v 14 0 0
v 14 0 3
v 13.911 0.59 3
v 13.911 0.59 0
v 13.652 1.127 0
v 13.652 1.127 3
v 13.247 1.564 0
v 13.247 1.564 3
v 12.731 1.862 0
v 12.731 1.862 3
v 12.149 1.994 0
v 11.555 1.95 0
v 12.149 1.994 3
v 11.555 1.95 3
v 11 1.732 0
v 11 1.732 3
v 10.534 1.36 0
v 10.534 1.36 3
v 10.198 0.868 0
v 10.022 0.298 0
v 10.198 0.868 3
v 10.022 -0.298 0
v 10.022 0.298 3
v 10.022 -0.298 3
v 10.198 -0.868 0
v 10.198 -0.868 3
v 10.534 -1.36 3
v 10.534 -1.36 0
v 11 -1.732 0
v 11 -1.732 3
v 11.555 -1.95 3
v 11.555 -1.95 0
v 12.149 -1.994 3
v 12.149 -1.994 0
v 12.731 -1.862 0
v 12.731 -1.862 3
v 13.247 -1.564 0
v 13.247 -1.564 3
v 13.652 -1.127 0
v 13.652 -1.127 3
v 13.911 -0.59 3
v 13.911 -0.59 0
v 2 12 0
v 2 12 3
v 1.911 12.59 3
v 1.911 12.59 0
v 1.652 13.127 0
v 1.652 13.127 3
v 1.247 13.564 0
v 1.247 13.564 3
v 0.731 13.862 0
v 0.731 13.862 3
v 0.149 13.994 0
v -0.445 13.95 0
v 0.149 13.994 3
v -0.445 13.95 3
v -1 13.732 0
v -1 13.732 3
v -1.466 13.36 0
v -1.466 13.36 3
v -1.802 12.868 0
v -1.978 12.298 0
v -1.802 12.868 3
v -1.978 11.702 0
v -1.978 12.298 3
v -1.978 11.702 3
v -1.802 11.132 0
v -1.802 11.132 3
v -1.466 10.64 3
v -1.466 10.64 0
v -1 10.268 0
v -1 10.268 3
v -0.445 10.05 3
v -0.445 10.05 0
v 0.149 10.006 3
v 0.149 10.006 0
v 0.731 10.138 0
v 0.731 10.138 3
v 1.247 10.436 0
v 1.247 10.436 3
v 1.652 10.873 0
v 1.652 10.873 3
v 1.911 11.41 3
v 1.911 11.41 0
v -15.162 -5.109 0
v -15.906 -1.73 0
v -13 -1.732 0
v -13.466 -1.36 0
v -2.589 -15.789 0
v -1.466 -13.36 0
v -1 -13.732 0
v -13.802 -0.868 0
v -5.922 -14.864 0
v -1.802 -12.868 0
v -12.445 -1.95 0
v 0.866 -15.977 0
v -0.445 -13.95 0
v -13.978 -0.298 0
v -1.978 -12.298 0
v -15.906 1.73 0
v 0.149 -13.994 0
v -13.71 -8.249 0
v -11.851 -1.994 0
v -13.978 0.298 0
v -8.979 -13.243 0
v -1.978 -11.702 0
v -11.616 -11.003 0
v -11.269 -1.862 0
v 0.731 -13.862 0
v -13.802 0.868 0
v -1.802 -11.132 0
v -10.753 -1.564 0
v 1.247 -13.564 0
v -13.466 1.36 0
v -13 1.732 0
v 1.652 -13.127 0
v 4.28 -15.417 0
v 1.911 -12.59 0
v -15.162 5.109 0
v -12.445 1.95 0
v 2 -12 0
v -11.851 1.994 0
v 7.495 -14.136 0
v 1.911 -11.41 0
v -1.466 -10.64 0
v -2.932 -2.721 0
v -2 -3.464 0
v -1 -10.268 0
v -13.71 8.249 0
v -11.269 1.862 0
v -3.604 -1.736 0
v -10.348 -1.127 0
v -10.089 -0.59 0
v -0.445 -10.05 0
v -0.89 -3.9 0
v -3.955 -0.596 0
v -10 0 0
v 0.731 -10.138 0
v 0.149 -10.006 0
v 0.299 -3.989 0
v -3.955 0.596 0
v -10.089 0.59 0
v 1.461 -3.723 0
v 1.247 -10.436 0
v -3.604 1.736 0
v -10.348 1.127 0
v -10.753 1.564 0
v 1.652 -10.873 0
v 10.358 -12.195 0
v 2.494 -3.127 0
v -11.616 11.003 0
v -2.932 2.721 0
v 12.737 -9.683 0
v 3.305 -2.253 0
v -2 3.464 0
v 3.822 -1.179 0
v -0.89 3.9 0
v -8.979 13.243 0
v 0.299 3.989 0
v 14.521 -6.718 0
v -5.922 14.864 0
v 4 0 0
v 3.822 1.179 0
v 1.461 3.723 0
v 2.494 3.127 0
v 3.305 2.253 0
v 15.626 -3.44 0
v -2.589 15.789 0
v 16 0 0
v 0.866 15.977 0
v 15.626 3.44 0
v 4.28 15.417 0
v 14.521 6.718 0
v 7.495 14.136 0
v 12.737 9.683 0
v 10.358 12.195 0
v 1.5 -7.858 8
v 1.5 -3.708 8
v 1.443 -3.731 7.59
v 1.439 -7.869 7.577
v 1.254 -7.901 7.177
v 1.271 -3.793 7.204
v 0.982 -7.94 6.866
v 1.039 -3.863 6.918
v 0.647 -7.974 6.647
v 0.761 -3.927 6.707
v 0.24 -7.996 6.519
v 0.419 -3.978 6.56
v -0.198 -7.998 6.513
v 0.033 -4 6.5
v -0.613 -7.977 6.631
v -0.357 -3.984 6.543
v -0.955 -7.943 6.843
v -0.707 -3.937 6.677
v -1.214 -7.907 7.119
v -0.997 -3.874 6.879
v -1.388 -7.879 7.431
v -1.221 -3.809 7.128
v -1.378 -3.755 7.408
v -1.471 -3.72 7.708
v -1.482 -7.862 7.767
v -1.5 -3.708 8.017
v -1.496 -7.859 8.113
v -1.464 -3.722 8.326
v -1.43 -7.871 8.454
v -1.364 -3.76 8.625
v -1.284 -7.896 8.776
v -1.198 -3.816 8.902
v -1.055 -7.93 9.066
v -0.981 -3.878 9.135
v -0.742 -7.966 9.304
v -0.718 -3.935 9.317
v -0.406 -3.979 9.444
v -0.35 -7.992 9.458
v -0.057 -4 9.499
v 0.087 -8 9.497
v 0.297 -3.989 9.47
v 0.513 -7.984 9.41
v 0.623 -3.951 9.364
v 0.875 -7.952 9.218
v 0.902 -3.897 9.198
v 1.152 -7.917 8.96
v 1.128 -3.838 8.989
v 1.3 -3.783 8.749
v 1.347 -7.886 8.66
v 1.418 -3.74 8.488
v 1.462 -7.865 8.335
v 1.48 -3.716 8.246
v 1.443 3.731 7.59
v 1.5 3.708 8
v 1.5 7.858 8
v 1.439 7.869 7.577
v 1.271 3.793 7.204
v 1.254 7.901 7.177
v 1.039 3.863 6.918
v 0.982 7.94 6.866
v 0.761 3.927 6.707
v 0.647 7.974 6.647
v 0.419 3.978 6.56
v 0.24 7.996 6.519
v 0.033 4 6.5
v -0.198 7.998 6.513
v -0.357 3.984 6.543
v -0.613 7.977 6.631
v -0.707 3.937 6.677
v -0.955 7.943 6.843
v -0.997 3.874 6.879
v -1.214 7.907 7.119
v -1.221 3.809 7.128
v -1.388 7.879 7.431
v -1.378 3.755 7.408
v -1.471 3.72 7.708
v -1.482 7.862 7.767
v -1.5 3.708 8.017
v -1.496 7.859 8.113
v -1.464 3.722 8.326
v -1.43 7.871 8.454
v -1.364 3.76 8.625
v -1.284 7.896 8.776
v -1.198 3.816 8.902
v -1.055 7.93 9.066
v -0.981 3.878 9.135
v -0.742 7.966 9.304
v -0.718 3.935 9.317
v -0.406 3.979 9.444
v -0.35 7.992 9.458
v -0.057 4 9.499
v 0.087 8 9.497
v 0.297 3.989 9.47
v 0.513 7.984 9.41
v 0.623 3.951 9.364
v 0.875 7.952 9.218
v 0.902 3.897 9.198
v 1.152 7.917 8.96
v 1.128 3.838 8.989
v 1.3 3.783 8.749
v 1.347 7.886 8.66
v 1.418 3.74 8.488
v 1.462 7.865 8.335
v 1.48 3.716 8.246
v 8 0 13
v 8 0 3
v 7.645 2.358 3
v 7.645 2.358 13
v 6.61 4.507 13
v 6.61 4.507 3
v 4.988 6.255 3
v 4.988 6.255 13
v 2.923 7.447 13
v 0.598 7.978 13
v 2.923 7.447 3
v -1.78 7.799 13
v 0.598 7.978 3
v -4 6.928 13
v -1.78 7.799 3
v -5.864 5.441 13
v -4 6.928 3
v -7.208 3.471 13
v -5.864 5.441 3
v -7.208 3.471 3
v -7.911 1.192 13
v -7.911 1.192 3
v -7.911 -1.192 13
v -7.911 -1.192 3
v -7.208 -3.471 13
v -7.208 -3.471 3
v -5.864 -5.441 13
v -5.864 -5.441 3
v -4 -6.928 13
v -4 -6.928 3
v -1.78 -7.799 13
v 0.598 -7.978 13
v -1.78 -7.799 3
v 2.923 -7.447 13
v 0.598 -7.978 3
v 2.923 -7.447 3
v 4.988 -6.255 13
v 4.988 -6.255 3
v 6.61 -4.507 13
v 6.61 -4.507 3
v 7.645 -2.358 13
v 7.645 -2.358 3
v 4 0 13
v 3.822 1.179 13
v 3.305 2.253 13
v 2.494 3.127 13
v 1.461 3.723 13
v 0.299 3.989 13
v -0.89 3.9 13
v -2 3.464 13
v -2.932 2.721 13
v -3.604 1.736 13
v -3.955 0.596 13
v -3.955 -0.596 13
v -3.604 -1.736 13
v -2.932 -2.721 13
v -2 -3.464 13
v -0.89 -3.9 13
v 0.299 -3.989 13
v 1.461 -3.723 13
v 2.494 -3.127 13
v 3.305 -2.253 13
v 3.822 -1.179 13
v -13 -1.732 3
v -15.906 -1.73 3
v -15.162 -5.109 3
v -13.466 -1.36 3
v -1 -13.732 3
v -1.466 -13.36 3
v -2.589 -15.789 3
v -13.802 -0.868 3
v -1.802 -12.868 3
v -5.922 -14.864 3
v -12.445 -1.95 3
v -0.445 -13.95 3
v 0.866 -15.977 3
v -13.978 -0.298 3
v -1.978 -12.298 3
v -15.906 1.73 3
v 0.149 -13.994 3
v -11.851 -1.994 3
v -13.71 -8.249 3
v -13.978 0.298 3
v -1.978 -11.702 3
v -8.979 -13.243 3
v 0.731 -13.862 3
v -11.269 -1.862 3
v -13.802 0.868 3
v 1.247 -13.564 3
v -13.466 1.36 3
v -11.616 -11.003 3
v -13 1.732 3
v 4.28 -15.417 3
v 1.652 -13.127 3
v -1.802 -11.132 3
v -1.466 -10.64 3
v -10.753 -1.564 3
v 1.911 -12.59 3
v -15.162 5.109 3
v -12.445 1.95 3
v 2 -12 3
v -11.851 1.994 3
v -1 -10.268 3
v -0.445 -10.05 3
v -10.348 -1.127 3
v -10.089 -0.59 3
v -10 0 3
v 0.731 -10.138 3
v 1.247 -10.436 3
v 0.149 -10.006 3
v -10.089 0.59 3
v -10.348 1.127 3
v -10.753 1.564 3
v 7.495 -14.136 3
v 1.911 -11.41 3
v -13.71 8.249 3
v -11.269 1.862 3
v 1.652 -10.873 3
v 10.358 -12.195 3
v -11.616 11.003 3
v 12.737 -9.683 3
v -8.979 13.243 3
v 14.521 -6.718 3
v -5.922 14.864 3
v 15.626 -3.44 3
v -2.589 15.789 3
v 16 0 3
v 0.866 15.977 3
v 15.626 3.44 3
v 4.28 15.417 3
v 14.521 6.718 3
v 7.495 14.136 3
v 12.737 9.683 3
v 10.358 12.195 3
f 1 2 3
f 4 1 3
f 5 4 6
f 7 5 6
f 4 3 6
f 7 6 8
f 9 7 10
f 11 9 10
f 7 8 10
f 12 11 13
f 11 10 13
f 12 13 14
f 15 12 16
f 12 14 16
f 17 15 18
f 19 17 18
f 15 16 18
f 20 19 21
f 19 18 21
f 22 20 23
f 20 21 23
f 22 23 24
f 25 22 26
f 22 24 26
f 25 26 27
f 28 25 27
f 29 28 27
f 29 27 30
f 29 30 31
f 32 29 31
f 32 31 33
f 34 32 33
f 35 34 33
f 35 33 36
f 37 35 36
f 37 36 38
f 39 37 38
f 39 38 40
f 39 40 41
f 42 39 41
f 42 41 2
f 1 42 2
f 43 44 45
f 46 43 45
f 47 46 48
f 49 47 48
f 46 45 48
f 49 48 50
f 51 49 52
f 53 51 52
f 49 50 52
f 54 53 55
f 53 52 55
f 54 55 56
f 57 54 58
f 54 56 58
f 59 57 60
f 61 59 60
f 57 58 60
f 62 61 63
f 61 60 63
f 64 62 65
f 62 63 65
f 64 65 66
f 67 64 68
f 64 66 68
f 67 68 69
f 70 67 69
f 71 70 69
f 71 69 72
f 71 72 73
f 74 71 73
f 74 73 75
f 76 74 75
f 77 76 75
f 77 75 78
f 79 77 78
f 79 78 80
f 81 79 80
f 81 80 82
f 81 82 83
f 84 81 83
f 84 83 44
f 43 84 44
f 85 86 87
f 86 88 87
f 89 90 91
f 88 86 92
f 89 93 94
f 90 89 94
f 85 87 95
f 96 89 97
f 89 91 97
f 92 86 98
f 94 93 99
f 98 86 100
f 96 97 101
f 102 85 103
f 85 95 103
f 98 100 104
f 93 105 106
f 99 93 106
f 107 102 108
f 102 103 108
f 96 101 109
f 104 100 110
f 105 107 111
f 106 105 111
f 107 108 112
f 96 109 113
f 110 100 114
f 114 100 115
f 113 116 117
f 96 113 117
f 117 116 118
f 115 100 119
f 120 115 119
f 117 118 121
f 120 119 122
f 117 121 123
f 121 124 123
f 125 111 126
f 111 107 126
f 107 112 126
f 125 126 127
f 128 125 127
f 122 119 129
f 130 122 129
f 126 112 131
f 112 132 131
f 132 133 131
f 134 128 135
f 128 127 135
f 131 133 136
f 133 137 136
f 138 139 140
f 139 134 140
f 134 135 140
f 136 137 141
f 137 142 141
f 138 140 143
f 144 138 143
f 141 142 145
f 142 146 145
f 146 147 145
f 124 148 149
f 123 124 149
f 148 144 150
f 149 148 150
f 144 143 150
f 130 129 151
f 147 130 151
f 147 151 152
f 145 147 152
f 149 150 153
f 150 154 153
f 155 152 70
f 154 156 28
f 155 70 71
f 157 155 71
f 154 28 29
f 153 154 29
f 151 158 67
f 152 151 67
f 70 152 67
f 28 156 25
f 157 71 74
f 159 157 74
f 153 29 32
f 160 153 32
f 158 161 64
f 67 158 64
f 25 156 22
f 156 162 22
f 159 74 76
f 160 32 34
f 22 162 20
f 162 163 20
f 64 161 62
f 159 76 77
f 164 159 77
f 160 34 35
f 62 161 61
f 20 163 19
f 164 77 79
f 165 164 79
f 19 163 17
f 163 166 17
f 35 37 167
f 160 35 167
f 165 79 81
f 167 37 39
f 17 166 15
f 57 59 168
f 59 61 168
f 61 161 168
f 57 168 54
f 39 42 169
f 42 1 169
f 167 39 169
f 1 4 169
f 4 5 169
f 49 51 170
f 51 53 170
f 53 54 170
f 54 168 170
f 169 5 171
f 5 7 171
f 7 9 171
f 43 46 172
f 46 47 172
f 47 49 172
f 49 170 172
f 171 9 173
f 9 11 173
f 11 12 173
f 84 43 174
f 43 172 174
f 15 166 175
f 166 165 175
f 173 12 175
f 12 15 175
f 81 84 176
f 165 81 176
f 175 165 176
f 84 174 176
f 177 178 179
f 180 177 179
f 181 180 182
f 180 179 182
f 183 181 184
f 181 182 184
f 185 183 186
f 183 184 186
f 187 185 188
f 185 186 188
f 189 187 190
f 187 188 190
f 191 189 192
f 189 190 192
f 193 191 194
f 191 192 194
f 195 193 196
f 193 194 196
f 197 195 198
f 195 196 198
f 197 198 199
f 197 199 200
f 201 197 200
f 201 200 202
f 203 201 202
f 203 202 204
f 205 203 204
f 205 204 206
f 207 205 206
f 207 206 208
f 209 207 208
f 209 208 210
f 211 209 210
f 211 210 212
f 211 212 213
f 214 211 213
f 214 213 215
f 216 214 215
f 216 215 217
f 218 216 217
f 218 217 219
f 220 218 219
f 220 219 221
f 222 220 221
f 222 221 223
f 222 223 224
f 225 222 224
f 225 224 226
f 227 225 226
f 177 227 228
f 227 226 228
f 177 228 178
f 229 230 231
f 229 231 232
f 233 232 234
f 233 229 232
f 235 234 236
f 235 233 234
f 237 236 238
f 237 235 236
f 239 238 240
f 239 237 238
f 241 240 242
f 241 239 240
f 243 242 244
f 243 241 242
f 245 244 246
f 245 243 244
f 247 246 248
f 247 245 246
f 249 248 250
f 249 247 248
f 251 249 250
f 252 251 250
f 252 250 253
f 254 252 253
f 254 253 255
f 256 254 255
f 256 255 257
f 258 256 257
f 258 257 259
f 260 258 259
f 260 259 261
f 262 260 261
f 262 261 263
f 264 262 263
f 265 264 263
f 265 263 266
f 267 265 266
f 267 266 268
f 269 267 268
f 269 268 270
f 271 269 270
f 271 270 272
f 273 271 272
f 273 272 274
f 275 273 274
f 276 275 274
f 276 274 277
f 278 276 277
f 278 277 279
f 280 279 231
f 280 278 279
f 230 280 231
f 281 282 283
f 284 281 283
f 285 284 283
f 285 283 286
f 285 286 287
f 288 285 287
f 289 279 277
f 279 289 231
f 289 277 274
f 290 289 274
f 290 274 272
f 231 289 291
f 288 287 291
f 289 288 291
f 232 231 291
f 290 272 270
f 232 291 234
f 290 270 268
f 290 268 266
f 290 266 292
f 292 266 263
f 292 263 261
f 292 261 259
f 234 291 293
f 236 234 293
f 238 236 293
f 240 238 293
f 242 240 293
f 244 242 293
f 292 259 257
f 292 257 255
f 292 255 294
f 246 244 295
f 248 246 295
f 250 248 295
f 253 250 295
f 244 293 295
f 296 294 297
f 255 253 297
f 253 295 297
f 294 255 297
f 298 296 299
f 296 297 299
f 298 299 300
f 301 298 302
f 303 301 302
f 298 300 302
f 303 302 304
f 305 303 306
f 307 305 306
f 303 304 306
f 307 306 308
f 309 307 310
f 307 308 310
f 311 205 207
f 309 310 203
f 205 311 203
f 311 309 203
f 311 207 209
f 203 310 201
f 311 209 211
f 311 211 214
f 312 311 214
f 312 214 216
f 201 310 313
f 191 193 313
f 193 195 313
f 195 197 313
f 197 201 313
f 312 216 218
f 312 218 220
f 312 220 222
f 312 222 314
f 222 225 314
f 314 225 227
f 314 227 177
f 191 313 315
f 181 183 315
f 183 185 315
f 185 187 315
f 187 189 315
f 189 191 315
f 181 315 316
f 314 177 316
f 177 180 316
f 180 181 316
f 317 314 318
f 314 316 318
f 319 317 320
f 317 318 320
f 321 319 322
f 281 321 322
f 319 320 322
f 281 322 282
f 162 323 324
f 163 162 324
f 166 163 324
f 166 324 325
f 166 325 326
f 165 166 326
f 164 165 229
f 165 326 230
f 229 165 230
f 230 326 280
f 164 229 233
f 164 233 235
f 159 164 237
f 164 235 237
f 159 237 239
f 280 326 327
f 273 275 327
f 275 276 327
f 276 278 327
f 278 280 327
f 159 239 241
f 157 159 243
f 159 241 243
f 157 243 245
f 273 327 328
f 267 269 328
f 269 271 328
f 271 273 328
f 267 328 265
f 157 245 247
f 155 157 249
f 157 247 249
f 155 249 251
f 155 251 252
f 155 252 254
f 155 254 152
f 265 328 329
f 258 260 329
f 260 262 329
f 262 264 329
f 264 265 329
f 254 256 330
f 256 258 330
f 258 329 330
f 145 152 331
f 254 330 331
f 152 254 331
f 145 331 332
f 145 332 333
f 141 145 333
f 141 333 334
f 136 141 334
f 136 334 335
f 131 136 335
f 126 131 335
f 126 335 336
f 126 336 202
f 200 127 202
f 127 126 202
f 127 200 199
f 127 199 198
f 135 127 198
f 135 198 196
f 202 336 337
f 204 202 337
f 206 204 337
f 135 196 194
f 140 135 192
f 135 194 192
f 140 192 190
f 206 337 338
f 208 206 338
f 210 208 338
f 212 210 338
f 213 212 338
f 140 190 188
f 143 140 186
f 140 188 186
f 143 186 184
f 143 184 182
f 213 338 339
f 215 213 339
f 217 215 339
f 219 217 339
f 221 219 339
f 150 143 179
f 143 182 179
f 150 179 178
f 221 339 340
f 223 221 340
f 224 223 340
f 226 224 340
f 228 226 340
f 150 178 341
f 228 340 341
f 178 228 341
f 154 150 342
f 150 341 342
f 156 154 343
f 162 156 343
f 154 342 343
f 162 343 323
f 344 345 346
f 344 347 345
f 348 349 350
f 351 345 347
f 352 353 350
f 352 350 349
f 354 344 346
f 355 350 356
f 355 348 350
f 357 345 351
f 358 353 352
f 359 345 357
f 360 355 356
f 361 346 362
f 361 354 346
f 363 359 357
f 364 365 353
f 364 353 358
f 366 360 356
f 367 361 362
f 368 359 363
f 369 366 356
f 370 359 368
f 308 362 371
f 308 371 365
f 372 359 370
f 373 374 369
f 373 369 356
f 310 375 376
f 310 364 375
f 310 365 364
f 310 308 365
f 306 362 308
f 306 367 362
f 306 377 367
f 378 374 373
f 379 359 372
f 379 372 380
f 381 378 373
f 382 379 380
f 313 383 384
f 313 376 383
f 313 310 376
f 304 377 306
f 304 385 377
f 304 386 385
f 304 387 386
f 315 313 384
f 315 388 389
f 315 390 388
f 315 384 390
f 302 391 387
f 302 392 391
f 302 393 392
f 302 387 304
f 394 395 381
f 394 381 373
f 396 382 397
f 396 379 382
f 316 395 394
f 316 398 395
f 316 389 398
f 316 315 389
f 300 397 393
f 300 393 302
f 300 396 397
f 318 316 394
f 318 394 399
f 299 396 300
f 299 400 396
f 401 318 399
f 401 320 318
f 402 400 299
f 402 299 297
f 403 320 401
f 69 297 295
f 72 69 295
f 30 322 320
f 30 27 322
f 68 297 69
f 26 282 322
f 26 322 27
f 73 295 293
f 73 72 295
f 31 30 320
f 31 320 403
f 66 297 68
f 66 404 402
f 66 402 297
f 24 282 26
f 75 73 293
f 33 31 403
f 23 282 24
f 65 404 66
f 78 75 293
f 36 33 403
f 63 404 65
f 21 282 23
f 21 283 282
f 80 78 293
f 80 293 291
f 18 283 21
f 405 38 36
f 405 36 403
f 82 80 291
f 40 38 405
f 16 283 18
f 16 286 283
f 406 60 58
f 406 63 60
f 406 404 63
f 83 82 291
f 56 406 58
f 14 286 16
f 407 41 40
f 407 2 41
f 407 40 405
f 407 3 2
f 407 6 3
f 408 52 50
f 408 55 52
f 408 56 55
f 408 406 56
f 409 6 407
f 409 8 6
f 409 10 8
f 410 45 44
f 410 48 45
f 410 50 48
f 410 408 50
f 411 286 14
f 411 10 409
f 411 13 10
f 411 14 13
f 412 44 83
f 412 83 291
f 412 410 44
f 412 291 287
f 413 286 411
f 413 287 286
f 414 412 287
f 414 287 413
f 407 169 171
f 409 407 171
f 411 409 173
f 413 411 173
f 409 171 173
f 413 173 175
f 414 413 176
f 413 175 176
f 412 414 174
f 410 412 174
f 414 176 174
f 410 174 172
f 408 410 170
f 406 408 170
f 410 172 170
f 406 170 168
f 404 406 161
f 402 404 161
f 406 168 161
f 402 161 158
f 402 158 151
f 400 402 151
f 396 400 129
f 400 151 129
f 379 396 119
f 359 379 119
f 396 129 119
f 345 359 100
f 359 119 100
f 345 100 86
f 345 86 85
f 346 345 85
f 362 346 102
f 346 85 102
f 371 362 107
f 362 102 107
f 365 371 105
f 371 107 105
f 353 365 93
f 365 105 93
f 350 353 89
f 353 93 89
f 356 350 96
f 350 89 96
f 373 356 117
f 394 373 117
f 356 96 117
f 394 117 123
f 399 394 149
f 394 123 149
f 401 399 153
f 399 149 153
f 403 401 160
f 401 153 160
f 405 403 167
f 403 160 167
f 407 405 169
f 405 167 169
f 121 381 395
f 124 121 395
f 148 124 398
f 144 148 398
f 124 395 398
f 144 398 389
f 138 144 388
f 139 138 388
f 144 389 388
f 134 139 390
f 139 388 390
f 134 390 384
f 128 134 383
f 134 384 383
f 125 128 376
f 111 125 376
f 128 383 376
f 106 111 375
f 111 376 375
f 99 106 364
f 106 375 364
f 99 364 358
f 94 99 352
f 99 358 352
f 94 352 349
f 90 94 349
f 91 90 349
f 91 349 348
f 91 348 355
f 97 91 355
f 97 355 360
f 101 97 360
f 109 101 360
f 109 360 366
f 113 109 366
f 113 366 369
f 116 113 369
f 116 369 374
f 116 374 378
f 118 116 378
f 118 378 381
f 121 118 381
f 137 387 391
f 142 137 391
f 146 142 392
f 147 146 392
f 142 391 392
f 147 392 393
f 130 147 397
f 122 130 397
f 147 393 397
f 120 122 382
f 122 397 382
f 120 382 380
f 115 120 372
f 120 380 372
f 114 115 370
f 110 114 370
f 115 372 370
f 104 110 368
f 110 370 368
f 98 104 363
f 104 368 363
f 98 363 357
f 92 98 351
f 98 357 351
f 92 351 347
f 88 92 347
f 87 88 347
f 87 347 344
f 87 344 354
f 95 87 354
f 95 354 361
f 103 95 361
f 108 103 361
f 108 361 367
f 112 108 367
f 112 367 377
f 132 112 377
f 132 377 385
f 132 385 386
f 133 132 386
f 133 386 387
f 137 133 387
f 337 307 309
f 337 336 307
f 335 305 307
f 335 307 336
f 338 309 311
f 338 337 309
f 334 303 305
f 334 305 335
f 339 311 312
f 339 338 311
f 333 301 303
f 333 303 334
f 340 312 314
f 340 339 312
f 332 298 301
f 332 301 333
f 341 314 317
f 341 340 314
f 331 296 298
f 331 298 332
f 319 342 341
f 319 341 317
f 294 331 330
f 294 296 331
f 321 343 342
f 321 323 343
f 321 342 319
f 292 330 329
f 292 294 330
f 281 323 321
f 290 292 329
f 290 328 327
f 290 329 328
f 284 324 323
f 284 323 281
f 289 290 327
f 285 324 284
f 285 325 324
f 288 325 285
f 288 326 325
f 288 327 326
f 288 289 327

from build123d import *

# Parameters (mm, degrees)
SCHIZZO1_R                    = 16
ESTRUSIONE_ESTRUSIONE2_DEPTH  = 3
SCHIZZO2_R                    = 8
ESTRUSIONE_ESTRUSIONE3_DEPTH  = 10
SCHIZZO3_R                    = 4
SCHIZZO3_R_2                  = 2
TAGLIO_ESTRUSIONE1_DEPTH      = 1
TAGLIO_ESTRUSIONE1_DEPTH_BACK = 14
SCHIZZO4_R                    = 1.5
TAGLIO_ESTRUSIONE2_DEPTH      = 17
TAGLIO_ESTRUSIONE2_DEPTH_BACK = 17


with BuildPart() as part:
    # Schizzo1 → Estrusione-Estrusione2 (new body)
    with BuildSketch(Plane.XY):
        Circle(SCHIZZO1_R)
    extrude(amount=ESTRUSIONE_ESTRUSIONE2_DEPTH)

    # Schizzo2 → Estrusione-Estrusione3 (add)
    with BuildSketch(Plane.XY.offset(3)):
        Circle(SCHIZZO2_R)
    extrude(amount=ESTRUSIONE_ESTRUSIONE3_DEPTH)

    # Schizzo3 → Taglio-Estrusione1 (cut, two sides)
    with BuildSketch(Plane.XY.offset(13)) as taglio_estrusione1_sk:
        Circle(SCHIZZO3_R)
        with Locations((12, 0)):
            Circle(SCHIZZO3_R_2)
        with Locations((0, 12)):
            Circle(SCHIZZO3_R_2)
        with Locations((-12, 0)):
            Circle(SCHIZZO3_R_2)
        with Locations((0, -12)):
            Circle(SCHIZZO3_R_2)
    extrude(amount=TAGLIO_ESTRUSIONE1_DEPTH, mode=Mode.SUBTRACT)
    extrude(taglio_estrusione1_sk.sketch, amount=-TAGLIO_ESTRUSIONE1_DEPTH_BACK, mode=Mode.SUBTRACT)

    # Schizzo4 → Taglio-Estrusione2 (cut, two sides)
    with BuildSketch(Plane(origin=(0, 0, 0), x_dir=(1, 0, 0), z_dir=(0, 1, 0))) as taglio_estrusione2_sk:
        with Locations((0, -8)):
            Circle(SCHIZZO4_R)
    extrude(amount=TAGLIO_ESTRUSIONE2_DEPTH, mode=Mode.SUBTRACT)
    extrude(taglio_estrusione2_sk.sketch, amount=-TAGLIO_ESTRUSIONE2_DEPTH_BACK, mode=Mode.SUBTRACT)


solid = part.part
